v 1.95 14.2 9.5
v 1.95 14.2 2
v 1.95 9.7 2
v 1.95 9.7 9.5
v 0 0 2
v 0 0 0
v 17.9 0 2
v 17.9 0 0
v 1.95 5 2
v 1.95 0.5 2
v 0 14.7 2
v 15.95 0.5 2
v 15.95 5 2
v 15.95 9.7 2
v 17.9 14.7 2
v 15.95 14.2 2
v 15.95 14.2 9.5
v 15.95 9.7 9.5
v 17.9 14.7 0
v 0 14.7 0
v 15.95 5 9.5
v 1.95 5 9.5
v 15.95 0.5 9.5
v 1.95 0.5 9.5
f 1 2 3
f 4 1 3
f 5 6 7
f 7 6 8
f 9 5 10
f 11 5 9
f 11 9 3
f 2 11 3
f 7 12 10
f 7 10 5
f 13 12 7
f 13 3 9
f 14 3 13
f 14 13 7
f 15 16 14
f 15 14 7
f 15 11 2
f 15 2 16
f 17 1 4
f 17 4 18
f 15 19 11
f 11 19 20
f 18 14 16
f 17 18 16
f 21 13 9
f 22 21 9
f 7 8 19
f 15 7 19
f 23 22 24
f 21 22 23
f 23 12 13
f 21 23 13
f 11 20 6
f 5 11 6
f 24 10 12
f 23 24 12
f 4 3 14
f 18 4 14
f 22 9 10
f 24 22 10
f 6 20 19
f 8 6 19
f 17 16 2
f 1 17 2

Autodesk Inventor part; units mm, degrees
ref_plane "YZ Plane" through (0, 0, 0) normal (1, 0, 0) x (0, 1, 0)
ref_plane "XZ Plane" through (0, 0, 0) normal (0, 1, 0) x (-1, 0, 0)
ref_plane "XY Plane" through (0, 0, 0) normal (0, 0, 1) x (1, 0, 0)
sketch "Sketch1" plane through (0, 0, 0) normal (0, 0, 1) x (1, 0, 0)
  line L0 (0, 0) -> (17.9, 0)
  line L1 (17.9, 0) -> (17.9, 14.7)
  line L2 (17.9, 14.7) -> (0, 14.7)
  line L3 (0, 14.7) -> (0, 0)
  dimension "d0" = 17.9
  dimension "d1" = 14.7
extrude "Extrusion1" add sketch "Sketch1" along normal blind 2
sketch "Sketch2" plane through (0, 0, 2) normal (0, 0, 1) x (1, 0, 0)
  line L0 (1.95, 0.5) -> (15.95, 0.5)
  line L1 (15.95, 0.5) -> (15.95, 5)
  line L2 (15.95, 5) -> (1.95, 5)
  line L3 (1.95, 5) -> (1.95, 0.5)
  line L4 (0, 0) -> (17.9, 0) projected
  line L5 (17.9, 0) -> (17.9, 14.7) projected
  line L6 (0, 14.7) -> (0, 0) projected
  line L7 (1.95, 9.7) -> (15.95, 9.7)
  line L8 (15.95, 9.7) -> (15.95, 14.2)
  line L9 (15.95, 14.2) -> (1.95, 14.2)
  line L10 (1.95, 14.2) -> (1.95, 9.7)
  line L11 (17.9, 14.7) -> (0, 14.7) projected
  dimension "d6" = 0.5
  dimension "d7" = 4.5
  dimension "d8" = 14
  dimension "d9" = 1.95
  dimension "d10" = 1.95
  dimension "d11" = 4.5
  dimension "d12" = 14
  dimension "d13" = 0.5
  dimension "d14" = 1.95
  dimension "d15" = 1.95
extrude "Extrusion2" add sketch "Sketch2" along normal blind 7.5 contours L3 L2 L1 L0 | L10 L9 L8 L7
properties part number "HDMI_Jumper"
